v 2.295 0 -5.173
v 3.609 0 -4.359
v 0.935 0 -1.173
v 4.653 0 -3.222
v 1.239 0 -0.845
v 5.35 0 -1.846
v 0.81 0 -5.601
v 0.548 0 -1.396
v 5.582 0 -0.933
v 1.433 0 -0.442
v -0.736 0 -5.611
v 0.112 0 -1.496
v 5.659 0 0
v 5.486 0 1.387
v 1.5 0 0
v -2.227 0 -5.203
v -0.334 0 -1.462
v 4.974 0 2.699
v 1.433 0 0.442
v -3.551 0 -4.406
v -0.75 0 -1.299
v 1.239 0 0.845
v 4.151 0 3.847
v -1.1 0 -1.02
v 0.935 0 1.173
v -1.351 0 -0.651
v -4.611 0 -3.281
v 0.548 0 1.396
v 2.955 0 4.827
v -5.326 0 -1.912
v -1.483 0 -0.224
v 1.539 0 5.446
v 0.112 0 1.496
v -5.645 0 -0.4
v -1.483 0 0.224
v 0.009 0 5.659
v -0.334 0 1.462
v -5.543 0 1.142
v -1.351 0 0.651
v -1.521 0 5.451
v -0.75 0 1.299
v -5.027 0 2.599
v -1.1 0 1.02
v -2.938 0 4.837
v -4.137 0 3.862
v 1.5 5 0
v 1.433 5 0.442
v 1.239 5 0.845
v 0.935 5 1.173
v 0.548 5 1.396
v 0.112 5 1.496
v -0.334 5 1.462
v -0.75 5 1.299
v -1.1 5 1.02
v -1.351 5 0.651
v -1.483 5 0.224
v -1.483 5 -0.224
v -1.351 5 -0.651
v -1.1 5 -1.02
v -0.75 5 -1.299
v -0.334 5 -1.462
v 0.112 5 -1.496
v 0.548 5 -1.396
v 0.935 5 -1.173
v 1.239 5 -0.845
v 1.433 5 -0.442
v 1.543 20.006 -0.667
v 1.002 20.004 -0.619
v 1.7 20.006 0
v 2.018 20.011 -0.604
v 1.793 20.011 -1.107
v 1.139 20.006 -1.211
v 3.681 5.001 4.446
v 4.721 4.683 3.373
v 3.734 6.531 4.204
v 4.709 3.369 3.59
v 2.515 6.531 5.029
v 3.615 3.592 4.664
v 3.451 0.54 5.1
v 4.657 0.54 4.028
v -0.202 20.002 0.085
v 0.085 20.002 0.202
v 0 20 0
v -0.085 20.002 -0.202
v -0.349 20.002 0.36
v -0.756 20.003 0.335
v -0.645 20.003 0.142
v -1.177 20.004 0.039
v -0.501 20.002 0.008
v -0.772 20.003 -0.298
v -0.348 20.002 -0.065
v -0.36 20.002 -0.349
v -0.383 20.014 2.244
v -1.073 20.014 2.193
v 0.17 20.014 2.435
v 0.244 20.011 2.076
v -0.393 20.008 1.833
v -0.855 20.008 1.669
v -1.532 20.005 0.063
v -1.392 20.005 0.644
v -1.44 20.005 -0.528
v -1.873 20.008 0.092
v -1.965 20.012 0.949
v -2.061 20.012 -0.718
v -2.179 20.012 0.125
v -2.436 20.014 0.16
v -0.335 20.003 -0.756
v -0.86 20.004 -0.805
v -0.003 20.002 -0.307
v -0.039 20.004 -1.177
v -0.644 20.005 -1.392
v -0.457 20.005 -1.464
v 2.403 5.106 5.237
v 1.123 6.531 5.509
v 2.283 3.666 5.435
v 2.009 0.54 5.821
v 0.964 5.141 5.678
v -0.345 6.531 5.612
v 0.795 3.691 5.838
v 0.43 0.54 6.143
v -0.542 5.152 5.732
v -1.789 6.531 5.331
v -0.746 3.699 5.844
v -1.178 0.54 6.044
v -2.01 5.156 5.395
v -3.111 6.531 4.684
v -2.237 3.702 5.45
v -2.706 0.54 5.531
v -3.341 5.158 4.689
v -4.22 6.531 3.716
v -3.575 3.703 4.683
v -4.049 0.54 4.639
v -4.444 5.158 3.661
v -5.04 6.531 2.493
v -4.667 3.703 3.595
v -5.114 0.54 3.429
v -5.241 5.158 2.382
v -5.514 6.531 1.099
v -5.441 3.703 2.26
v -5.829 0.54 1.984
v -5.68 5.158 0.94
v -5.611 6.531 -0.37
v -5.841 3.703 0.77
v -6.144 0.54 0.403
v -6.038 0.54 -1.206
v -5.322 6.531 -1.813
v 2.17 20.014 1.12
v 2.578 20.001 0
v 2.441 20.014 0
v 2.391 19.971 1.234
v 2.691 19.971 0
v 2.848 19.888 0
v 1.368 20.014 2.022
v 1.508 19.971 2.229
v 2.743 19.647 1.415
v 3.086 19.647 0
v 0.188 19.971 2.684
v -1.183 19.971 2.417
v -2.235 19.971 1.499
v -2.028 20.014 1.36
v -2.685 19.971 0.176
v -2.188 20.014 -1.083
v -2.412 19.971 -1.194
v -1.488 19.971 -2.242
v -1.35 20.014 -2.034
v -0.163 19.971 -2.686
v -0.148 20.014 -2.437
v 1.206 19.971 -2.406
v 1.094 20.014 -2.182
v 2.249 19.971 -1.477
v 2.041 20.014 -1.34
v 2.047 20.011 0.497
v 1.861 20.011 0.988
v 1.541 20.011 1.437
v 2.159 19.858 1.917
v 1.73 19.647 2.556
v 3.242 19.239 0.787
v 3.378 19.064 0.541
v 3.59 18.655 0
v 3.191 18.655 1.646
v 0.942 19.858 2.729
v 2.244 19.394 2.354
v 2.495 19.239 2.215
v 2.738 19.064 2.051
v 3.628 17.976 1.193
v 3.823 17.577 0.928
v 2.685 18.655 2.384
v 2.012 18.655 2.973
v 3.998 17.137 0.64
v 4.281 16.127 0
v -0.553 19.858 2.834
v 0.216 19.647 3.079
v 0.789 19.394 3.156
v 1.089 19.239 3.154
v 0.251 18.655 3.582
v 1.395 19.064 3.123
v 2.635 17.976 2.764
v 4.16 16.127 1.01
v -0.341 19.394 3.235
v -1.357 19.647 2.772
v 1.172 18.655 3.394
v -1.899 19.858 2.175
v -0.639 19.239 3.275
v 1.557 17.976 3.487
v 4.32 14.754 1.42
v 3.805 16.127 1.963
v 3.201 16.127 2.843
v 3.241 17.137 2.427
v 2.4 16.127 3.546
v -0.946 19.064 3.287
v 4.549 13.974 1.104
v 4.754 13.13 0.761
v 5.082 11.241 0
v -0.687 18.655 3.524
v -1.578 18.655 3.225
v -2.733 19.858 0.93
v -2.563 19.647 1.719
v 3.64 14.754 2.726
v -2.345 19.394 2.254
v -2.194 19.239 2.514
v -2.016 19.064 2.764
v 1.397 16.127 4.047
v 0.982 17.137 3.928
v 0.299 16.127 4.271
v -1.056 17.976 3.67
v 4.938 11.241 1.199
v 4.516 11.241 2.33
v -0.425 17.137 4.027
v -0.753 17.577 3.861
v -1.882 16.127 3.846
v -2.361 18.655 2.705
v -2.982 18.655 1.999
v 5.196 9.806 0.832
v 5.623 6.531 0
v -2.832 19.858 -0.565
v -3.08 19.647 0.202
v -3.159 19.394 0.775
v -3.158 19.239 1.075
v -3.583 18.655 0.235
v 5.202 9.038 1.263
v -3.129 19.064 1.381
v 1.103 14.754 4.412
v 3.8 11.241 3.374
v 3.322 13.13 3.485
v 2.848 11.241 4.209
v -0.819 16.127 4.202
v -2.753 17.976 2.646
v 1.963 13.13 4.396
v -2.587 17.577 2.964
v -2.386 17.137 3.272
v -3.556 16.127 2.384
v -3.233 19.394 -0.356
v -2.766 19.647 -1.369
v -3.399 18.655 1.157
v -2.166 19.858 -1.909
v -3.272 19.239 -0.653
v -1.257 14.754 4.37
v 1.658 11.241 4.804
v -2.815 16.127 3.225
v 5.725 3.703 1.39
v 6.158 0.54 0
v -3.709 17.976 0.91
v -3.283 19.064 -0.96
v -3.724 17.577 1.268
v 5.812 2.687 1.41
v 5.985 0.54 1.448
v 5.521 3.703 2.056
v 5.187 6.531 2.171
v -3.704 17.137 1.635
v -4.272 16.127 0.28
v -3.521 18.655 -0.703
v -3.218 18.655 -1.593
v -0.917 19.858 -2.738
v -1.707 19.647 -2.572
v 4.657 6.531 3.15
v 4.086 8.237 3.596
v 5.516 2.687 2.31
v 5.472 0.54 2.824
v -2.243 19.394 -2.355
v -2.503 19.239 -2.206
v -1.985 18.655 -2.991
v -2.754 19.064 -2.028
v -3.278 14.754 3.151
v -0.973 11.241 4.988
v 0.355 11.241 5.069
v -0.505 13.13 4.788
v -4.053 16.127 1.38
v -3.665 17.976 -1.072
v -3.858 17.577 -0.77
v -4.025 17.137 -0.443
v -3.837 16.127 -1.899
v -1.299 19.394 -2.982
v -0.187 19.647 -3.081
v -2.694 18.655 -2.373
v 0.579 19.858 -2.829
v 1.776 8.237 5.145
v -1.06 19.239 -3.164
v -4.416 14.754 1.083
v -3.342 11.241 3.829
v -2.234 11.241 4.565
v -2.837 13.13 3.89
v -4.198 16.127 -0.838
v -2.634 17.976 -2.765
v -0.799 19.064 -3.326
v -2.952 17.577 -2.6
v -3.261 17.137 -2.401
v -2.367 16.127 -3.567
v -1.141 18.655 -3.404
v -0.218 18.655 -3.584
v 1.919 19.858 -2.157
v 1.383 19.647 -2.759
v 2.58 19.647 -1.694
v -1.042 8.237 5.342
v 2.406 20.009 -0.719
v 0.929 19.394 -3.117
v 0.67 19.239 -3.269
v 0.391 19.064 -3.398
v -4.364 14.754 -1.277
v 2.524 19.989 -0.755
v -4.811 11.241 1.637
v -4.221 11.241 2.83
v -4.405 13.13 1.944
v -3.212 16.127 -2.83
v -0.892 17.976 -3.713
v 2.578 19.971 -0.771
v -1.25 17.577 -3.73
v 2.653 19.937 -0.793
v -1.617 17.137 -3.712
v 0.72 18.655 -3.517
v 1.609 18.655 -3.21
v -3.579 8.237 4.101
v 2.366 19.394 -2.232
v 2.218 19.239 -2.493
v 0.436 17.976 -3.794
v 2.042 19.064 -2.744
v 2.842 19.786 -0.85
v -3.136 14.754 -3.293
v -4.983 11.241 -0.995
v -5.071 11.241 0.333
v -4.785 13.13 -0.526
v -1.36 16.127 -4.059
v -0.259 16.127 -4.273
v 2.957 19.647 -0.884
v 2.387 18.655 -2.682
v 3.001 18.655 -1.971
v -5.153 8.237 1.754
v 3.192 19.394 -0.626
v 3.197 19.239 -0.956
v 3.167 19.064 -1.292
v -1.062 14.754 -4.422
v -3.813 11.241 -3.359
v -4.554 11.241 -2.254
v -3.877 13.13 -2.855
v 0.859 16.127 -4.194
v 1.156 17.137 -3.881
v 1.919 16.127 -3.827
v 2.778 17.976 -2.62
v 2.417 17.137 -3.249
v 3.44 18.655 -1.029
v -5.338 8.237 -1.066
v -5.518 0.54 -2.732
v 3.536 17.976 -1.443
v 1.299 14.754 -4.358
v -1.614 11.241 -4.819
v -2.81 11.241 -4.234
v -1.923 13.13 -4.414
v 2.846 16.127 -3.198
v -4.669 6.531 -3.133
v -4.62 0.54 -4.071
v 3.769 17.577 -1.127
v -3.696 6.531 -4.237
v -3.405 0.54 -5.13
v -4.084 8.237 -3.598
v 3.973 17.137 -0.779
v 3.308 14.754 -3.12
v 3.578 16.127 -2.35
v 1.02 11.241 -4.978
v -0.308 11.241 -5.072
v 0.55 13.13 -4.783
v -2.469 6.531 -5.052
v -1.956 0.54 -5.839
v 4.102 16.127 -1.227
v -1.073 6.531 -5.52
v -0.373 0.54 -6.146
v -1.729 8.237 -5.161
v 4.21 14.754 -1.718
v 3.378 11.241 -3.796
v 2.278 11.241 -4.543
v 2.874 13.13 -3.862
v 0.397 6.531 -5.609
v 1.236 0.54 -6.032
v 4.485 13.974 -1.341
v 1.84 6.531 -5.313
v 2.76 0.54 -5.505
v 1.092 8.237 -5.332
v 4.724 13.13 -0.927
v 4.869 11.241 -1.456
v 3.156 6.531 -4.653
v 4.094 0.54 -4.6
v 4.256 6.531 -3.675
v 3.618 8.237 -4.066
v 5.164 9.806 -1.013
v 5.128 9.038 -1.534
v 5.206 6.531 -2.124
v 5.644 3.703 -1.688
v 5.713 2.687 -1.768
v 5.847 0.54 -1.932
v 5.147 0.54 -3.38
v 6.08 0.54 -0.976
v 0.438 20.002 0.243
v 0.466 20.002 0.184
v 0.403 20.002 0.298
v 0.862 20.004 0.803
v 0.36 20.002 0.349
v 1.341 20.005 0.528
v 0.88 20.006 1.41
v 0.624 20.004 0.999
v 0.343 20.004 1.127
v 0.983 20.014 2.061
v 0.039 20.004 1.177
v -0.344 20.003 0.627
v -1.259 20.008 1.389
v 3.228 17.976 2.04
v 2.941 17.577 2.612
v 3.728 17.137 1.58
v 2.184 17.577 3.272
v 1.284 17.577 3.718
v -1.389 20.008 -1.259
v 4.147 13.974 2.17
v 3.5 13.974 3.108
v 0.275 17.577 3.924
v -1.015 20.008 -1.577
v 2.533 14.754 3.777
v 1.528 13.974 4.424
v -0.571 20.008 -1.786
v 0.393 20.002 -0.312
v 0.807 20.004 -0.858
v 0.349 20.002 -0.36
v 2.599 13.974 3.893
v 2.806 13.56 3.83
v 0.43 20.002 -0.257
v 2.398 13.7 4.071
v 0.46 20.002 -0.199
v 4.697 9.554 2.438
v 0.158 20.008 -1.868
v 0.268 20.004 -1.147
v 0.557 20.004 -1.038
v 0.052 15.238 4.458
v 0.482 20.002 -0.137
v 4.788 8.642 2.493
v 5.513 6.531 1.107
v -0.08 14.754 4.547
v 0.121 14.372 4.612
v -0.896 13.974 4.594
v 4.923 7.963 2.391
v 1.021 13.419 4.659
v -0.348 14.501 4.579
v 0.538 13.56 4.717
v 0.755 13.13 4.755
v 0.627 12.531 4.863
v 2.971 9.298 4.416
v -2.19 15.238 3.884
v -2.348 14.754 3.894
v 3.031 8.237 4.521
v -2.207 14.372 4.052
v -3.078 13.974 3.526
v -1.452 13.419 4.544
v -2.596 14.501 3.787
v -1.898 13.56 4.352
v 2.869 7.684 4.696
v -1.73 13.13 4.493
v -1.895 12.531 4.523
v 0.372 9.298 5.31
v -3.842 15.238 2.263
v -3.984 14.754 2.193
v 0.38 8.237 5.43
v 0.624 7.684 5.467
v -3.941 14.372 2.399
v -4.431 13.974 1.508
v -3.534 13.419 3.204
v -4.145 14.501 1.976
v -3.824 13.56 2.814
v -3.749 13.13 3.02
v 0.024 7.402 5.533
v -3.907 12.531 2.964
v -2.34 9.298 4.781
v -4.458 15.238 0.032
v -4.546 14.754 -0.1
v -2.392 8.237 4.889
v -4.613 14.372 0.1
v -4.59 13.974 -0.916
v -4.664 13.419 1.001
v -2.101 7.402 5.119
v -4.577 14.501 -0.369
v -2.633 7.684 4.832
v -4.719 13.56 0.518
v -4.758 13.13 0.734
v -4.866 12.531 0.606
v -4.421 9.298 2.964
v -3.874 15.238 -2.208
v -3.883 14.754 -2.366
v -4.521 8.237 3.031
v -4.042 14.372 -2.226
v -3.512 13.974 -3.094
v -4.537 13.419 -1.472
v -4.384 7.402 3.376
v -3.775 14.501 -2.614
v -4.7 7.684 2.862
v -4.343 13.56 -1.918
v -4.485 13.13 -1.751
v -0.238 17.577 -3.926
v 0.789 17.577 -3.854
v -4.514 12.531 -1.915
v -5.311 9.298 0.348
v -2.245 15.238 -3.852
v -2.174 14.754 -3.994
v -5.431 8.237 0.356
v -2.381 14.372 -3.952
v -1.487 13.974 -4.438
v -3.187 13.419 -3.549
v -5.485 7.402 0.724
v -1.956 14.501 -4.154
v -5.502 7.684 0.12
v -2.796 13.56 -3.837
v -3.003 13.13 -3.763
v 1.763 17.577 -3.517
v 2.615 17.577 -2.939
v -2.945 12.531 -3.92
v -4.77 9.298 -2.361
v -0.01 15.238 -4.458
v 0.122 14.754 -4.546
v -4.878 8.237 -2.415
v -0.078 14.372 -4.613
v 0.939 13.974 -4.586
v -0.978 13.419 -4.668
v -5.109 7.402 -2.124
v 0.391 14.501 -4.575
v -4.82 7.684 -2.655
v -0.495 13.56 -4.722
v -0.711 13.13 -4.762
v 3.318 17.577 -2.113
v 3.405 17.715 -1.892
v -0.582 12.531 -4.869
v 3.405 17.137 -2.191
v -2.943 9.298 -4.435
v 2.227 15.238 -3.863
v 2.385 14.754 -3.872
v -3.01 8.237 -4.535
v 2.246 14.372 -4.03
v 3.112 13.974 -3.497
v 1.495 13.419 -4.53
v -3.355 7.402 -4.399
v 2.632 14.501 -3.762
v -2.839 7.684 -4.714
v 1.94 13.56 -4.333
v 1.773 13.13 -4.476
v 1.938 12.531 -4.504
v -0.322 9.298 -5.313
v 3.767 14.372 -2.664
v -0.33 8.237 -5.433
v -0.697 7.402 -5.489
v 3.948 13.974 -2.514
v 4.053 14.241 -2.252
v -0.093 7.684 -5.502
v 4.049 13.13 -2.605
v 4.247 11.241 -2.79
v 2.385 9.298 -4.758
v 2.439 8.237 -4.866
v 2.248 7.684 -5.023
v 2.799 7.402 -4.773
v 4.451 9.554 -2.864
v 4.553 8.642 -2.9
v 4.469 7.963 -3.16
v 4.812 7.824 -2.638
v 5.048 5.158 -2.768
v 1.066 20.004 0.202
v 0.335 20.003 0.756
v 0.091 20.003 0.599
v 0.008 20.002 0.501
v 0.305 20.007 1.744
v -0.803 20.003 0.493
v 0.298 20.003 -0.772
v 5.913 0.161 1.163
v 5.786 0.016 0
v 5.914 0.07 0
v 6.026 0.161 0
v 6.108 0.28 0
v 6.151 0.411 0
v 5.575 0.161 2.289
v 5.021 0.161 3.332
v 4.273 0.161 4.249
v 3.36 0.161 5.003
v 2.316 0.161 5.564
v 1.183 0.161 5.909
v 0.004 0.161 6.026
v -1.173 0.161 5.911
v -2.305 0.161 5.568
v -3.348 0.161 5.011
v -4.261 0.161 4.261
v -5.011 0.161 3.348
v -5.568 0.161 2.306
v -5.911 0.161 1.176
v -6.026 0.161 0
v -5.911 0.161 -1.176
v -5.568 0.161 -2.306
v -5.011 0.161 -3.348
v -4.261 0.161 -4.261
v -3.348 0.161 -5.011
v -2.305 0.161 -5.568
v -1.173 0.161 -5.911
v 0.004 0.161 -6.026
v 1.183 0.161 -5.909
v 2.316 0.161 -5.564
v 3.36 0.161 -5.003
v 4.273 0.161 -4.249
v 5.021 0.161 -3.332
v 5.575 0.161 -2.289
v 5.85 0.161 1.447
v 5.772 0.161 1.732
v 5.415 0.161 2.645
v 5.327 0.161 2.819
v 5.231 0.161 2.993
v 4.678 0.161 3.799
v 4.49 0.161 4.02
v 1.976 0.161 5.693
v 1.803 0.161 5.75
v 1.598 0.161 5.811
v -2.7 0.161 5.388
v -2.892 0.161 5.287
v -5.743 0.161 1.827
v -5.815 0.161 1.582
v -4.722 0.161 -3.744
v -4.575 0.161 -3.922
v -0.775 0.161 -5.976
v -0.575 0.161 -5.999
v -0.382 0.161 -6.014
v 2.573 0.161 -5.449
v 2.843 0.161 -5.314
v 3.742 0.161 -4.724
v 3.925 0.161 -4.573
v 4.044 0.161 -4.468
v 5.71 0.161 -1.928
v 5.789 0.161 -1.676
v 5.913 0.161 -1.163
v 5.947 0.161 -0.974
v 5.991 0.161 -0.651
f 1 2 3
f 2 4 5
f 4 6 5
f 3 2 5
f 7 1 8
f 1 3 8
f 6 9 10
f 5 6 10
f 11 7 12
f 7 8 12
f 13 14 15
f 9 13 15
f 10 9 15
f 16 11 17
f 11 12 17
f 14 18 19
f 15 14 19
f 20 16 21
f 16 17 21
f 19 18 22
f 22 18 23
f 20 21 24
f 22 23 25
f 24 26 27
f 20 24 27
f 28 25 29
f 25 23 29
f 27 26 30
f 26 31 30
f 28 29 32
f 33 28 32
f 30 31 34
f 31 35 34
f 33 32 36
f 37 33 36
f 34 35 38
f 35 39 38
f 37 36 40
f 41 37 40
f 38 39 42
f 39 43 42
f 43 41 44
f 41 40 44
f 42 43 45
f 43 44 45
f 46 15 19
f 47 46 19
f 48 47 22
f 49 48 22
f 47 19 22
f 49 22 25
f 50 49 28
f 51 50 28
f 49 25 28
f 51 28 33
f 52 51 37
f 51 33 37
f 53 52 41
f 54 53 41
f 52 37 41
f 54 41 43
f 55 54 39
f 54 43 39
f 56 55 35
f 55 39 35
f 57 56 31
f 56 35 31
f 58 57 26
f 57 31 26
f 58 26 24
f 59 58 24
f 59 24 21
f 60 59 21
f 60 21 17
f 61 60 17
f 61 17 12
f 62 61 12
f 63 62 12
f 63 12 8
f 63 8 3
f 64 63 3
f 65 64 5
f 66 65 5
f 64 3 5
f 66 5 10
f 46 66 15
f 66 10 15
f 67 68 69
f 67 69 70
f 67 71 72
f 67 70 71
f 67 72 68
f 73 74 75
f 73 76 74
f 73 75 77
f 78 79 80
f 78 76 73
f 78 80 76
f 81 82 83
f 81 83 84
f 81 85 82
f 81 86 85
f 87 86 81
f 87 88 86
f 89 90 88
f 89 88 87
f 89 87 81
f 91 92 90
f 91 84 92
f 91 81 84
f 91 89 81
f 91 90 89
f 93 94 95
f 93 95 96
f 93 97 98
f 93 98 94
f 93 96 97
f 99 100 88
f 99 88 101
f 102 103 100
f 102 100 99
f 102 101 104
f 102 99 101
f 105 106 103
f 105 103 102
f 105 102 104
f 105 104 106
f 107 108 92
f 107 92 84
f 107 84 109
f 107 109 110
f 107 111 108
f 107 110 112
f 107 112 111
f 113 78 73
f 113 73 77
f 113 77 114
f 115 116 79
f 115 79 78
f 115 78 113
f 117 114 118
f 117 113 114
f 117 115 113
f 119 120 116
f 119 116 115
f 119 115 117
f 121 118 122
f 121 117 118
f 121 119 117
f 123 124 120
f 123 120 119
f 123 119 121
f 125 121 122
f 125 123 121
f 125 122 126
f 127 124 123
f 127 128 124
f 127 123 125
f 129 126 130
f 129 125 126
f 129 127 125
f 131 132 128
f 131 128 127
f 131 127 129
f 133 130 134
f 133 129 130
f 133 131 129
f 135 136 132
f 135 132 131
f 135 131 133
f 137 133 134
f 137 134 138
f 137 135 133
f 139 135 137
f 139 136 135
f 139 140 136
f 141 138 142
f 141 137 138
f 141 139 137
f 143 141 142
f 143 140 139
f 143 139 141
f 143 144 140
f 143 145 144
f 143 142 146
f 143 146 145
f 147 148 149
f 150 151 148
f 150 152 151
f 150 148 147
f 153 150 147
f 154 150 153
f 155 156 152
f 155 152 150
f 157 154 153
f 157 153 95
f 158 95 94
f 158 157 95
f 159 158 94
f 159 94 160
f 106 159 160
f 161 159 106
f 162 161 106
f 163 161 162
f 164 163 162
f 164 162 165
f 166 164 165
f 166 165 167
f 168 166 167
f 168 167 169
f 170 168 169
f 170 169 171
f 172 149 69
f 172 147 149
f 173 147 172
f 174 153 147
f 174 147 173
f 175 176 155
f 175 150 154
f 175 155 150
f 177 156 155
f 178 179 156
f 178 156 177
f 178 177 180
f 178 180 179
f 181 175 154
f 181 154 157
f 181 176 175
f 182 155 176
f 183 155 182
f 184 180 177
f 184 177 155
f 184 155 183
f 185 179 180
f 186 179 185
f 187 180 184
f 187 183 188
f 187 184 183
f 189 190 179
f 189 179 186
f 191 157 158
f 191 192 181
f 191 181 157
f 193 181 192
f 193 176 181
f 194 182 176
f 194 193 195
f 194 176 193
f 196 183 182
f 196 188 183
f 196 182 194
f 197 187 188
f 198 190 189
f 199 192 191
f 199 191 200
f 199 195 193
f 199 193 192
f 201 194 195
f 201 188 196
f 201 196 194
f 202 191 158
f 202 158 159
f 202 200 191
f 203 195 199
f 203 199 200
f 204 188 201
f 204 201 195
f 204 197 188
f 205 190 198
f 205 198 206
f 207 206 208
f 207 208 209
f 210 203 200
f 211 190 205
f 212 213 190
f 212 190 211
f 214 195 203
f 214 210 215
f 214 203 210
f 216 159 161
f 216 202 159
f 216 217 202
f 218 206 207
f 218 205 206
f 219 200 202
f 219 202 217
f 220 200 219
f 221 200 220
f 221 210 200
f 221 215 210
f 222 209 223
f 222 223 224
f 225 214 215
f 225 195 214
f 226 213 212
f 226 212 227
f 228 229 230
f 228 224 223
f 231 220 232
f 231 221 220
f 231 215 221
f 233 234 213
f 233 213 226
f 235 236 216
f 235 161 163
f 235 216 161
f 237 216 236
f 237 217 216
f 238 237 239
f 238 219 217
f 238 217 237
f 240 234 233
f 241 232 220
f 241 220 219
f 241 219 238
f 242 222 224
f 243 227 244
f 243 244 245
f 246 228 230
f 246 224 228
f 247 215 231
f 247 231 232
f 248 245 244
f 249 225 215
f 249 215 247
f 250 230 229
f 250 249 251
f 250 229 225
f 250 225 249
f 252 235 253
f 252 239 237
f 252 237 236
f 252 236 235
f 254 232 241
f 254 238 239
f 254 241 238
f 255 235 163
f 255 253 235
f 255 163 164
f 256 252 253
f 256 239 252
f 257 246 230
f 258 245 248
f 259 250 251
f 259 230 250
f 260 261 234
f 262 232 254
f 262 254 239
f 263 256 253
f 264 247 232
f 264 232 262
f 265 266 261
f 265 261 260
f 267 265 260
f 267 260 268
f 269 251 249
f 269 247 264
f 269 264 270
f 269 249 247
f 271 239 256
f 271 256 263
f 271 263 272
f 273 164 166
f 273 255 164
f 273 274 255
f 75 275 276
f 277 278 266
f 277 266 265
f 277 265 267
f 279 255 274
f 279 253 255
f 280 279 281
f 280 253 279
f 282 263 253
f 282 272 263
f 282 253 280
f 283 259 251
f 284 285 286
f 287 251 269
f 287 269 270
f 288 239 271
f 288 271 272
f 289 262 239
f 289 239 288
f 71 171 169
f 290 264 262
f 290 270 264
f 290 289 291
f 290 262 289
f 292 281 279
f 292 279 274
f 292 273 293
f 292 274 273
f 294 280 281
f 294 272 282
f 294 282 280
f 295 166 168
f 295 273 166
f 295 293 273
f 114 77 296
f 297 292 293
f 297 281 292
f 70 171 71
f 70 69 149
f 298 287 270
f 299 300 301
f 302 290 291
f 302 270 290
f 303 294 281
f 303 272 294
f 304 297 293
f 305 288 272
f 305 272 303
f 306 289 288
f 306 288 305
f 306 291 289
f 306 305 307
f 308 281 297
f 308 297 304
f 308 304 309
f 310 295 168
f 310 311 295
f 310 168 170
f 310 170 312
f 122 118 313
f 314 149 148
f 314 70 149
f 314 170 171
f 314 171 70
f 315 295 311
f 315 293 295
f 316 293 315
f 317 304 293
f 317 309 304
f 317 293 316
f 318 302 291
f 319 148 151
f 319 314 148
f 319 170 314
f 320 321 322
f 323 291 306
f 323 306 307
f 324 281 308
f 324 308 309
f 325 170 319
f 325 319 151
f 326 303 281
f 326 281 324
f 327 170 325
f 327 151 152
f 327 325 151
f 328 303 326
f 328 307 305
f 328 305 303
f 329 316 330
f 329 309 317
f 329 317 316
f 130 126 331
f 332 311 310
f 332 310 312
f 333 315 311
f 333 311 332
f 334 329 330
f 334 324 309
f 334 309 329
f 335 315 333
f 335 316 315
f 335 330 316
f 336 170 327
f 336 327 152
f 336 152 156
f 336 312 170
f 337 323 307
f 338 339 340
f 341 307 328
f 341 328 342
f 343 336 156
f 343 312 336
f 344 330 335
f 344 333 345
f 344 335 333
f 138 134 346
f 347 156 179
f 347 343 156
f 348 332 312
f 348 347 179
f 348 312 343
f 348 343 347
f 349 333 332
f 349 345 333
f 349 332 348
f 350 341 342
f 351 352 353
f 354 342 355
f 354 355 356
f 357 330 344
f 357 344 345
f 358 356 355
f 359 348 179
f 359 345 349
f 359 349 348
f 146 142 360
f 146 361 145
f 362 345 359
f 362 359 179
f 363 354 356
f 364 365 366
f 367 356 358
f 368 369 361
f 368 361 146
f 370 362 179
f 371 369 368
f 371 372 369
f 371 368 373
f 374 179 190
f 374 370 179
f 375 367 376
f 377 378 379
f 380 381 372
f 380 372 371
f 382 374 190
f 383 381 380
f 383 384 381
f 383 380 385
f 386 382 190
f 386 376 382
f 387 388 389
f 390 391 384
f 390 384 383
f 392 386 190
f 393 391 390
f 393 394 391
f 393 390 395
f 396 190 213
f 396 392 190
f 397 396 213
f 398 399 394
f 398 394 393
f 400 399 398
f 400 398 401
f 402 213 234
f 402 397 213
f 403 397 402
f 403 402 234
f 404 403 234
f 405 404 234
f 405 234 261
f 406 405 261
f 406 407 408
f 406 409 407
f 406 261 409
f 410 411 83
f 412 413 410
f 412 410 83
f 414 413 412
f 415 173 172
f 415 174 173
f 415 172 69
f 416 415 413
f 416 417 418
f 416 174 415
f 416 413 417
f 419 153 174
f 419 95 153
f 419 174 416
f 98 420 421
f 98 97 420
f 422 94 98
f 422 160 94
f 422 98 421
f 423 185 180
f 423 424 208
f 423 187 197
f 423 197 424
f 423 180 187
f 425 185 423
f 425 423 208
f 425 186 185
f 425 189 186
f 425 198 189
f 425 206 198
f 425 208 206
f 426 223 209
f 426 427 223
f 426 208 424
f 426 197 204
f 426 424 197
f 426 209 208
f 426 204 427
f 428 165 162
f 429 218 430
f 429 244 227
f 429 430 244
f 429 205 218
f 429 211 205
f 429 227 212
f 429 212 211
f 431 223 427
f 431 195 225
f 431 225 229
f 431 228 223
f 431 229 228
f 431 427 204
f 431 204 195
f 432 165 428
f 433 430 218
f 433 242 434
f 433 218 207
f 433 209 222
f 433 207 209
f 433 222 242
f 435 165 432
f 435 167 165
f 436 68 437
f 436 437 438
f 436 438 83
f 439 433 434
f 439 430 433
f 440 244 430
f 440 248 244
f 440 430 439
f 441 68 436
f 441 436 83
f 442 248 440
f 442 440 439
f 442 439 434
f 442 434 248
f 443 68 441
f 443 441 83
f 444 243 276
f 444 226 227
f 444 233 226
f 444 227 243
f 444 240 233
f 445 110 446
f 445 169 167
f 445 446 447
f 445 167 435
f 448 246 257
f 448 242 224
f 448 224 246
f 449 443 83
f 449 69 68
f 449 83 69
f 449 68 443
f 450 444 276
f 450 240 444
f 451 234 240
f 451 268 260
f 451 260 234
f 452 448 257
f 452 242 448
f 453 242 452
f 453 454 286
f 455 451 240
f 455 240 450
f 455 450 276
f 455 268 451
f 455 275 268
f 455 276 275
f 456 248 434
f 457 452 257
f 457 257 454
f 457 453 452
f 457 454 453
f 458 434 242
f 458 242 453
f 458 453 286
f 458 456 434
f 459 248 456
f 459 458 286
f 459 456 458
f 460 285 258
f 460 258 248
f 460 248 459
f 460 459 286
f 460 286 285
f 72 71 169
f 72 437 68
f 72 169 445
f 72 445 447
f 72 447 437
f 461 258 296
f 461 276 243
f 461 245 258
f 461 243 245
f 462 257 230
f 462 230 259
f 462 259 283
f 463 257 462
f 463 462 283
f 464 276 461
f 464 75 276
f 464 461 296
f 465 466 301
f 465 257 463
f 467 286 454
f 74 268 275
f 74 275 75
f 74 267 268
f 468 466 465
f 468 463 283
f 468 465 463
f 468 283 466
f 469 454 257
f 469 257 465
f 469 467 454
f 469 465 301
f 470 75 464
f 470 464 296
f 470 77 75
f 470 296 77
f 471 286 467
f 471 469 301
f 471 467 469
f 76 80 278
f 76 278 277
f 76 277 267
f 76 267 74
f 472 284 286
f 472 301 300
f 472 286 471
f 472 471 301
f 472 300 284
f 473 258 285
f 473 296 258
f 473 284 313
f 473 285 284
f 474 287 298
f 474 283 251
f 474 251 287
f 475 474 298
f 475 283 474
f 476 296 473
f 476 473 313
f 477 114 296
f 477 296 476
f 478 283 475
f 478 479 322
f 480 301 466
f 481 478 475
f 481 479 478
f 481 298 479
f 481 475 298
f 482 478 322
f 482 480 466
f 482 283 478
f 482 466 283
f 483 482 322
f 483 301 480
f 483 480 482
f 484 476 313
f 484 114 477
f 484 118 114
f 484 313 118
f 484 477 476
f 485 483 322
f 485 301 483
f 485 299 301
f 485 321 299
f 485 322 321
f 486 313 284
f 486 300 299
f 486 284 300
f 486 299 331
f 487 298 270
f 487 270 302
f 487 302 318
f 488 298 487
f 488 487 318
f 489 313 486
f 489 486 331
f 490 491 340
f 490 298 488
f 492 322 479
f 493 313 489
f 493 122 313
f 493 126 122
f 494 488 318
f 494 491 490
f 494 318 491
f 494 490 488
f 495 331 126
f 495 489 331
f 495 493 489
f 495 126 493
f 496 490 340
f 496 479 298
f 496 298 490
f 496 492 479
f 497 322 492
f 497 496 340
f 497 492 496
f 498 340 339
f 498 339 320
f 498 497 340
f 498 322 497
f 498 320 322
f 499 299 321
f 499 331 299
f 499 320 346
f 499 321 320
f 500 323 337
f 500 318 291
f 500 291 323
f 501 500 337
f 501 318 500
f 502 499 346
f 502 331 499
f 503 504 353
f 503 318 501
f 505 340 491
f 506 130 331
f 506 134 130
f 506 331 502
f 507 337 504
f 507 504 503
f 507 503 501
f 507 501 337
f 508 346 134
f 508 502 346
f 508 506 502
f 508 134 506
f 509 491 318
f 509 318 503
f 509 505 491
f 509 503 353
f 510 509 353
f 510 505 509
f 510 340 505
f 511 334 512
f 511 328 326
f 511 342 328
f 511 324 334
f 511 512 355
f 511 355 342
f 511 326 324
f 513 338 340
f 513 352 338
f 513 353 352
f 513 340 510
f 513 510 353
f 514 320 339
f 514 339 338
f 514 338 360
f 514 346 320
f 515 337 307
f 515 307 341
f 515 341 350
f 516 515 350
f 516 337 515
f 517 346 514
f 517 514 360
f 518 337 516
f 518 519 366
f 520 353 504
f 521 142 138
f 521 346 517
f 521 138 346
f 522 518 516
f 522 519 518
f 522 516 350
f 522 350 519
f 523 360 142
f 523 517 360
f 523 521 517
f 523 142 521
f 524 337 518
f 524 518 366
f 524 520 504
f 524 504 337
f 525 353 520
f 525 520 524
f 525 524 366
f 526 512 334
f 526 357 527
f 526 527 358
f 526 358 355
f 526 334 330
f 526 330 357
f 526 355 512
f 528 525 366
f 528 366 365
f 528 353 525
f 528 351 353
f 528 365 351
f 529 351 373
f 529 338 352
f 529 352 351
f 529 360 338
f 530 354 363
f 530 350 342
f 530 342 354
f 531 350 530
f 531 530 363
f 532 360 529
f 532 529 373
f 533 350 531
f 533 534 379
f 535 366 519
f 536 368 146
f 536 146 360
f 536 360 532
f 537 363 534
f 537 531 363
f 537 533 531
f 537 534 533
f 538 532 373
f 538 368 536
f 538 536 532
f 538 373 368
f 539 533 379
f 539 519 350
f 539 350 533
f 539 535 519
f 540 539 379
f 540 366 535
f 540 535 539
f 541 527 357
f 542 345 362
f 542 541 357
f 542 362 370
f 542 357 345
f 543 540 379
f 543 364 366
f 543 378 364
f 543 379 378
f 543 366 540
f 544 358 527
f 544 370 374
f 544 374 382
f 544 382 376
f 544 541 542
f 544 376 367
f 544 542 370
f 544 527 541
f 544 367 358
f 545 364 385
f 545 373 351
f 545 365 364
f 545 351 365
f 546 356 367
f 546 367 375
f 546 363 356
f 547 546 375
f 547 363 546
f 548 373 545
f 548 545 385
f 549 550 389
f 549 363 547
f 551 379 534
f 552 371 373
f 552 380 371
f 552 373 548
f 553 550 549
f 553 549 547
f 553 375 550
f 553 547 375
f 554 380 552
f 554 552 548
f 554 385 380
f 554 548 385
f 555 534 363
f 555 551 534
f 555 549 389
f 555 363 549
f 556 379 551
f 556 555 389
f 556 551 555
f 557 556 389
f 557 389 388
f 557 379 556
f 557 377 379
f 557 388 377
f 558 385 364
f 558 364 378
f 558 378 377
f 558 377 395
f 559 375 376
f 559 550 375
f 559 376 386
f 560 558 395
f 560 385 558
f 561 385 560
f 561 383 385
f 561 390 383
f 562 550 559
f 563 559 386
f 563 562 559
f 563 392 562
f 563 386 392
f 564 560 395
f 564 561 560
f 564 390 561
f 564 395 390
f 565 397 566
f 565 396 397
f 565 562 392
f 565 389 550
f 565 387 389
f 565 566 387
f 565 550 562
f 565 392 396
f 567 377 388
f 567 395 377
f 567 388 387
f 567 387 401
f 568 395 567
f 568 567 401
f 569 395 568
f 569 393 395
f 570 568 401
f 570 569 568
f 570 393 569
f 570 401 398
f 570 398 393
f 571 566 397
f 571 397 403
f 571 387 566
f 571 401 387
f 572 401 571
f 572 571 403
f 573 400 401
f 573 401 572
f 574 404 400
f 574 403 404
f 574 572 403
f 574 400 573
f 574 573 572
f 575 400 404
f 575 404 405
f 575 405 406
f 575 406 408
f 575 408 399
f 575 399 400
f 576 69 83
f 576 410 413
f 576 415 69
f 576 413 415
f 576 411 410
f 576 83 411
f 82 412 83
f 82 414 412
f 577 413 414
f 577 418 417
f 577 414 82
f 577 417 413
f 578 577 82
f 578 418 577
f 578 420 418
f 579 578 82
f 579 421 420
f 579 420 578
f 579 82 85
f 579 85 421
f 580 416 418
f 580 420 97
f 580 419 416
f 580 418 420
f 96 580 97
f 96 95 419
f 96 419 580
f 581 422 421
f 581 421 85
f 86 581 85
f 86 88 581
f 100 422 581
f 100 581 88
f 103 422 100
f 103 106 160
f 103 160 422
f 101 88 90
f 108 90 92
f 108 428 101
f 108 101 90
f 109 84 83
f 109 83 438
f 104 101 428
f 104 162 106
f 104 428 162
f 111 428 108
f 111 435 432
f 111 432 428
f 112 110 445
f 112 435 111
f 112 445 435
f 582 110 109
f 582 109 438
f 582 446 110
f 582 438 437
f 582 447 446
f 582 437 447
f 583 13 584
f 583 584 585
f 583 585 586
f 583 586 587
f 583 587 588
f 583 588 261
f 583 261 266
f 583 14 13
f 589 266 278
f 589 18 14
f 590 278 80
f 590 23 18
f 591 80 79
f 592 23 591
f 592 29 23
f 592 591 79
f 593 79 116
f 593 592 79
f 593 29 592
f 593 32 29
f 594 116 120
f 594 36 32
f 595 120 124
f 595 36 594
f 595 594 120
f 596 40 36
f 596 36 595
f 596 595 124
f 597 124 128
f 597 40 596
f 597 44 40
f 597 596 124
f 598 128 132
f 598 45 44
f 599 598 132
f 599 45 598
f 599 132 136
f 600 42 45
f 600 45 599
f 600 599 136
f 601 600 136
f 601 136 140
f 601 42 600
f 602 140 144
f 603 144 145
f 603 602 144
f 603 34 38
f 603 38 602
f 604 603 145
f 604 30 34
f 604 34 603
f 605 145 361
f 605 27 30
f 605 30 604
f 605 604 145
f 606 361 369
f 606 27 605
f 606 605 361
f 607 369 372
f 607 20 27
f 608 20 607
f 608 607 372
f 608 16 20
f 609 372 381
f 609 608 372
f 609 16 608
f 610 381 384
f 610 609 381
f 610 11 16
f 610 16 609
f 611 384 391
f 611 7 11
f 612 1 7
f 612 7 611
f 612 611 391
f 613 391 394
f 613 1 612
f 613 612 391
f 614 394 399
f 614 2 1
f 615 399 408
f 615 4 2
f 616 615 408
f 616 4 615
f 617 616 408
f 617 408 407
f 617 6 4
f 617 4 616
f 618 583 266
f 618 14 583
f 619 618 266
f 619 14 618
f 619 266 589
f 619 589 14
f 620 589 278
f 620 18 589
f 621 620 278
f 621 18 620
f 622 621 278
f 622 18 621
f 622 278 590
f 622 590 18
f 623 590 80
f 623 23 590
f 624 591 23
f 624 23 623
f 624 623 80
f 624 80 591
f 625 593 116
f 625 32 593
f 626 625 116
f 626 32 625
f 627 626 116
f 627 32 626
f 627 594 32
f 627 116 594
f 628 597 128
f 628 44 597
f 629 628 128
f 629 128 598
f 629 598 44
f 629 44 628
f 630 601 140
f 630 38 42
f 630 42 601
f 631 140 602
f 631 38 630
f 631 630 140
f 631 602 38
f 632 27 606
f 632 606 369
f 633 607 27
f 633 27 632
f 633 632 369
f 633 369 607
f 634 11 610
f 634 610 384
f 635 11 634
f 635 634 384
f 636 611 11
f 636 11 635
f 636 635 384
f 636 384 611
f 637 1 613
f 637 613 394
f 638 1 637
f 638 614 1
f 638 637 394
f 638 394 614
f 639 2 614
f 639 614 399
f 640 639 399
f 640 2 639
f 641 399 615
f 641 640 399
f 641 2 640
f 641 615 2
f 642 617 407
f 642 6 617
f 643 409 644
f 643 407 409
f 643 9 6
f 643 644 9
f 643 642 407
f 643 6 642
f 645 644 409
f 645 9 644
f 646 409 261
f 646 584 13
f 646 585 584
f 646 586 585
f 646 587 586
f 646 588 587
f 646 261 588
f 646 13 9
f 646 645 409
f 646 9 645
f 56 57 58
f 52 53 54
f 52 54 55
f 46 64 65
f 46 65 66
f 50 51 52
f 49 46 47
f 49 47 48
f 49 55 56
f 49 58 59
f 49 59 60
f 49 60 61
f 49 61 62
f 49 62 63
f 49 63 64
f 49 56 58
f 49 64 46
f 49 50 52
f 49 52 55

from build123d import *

# Parameters (mm, degrees)
FILETE1_R             = 0.5
ESBO_O2_R             = 1.5
CORTE_EXTRUS_O1_DEPTH = 5


with BuildPart() as part:
    # Esboço1 → Revolução1 (revolve)
    with BuildSketch(Plane.XY):
        with BuildLine():
            Line((0, 0), (6.2, 0))
            add(Edge.make_bspline(
                [(0, 20), (0.432351955, 20.004832283), (1.967438722, 19.998604271), (3.665241094, 20.06332036), (5.07224731, 14.471938807), (6.2, 0)],
                knots=[0, 0, 0, 0, 0.288601343, 0.388601343, 1, 1, 1, 1], degree=3))
            Line((0, 20), (0, 0))
        make_face()
    revolve(axis=Axis((0, 20, 0), (0, -1, 0)))

    # Filete1
    filete1_edges = [part.edges().sort_by_distance(p)[0] for p in [
        (-6.2, 0, 0),
    ]]
    fillet(filete1_edges, radius=FILETE1_R)

    # Esboço2 → Corte-extrusão1 (cut)
    with BuildSketch(Plane.XZ):
        Circle(ESBO_O2_R)
    extrude(amount=-CORTE_EXTRUS_O1_DEPTH, mode=Mode.SUBTRACT)


solid = part.part
